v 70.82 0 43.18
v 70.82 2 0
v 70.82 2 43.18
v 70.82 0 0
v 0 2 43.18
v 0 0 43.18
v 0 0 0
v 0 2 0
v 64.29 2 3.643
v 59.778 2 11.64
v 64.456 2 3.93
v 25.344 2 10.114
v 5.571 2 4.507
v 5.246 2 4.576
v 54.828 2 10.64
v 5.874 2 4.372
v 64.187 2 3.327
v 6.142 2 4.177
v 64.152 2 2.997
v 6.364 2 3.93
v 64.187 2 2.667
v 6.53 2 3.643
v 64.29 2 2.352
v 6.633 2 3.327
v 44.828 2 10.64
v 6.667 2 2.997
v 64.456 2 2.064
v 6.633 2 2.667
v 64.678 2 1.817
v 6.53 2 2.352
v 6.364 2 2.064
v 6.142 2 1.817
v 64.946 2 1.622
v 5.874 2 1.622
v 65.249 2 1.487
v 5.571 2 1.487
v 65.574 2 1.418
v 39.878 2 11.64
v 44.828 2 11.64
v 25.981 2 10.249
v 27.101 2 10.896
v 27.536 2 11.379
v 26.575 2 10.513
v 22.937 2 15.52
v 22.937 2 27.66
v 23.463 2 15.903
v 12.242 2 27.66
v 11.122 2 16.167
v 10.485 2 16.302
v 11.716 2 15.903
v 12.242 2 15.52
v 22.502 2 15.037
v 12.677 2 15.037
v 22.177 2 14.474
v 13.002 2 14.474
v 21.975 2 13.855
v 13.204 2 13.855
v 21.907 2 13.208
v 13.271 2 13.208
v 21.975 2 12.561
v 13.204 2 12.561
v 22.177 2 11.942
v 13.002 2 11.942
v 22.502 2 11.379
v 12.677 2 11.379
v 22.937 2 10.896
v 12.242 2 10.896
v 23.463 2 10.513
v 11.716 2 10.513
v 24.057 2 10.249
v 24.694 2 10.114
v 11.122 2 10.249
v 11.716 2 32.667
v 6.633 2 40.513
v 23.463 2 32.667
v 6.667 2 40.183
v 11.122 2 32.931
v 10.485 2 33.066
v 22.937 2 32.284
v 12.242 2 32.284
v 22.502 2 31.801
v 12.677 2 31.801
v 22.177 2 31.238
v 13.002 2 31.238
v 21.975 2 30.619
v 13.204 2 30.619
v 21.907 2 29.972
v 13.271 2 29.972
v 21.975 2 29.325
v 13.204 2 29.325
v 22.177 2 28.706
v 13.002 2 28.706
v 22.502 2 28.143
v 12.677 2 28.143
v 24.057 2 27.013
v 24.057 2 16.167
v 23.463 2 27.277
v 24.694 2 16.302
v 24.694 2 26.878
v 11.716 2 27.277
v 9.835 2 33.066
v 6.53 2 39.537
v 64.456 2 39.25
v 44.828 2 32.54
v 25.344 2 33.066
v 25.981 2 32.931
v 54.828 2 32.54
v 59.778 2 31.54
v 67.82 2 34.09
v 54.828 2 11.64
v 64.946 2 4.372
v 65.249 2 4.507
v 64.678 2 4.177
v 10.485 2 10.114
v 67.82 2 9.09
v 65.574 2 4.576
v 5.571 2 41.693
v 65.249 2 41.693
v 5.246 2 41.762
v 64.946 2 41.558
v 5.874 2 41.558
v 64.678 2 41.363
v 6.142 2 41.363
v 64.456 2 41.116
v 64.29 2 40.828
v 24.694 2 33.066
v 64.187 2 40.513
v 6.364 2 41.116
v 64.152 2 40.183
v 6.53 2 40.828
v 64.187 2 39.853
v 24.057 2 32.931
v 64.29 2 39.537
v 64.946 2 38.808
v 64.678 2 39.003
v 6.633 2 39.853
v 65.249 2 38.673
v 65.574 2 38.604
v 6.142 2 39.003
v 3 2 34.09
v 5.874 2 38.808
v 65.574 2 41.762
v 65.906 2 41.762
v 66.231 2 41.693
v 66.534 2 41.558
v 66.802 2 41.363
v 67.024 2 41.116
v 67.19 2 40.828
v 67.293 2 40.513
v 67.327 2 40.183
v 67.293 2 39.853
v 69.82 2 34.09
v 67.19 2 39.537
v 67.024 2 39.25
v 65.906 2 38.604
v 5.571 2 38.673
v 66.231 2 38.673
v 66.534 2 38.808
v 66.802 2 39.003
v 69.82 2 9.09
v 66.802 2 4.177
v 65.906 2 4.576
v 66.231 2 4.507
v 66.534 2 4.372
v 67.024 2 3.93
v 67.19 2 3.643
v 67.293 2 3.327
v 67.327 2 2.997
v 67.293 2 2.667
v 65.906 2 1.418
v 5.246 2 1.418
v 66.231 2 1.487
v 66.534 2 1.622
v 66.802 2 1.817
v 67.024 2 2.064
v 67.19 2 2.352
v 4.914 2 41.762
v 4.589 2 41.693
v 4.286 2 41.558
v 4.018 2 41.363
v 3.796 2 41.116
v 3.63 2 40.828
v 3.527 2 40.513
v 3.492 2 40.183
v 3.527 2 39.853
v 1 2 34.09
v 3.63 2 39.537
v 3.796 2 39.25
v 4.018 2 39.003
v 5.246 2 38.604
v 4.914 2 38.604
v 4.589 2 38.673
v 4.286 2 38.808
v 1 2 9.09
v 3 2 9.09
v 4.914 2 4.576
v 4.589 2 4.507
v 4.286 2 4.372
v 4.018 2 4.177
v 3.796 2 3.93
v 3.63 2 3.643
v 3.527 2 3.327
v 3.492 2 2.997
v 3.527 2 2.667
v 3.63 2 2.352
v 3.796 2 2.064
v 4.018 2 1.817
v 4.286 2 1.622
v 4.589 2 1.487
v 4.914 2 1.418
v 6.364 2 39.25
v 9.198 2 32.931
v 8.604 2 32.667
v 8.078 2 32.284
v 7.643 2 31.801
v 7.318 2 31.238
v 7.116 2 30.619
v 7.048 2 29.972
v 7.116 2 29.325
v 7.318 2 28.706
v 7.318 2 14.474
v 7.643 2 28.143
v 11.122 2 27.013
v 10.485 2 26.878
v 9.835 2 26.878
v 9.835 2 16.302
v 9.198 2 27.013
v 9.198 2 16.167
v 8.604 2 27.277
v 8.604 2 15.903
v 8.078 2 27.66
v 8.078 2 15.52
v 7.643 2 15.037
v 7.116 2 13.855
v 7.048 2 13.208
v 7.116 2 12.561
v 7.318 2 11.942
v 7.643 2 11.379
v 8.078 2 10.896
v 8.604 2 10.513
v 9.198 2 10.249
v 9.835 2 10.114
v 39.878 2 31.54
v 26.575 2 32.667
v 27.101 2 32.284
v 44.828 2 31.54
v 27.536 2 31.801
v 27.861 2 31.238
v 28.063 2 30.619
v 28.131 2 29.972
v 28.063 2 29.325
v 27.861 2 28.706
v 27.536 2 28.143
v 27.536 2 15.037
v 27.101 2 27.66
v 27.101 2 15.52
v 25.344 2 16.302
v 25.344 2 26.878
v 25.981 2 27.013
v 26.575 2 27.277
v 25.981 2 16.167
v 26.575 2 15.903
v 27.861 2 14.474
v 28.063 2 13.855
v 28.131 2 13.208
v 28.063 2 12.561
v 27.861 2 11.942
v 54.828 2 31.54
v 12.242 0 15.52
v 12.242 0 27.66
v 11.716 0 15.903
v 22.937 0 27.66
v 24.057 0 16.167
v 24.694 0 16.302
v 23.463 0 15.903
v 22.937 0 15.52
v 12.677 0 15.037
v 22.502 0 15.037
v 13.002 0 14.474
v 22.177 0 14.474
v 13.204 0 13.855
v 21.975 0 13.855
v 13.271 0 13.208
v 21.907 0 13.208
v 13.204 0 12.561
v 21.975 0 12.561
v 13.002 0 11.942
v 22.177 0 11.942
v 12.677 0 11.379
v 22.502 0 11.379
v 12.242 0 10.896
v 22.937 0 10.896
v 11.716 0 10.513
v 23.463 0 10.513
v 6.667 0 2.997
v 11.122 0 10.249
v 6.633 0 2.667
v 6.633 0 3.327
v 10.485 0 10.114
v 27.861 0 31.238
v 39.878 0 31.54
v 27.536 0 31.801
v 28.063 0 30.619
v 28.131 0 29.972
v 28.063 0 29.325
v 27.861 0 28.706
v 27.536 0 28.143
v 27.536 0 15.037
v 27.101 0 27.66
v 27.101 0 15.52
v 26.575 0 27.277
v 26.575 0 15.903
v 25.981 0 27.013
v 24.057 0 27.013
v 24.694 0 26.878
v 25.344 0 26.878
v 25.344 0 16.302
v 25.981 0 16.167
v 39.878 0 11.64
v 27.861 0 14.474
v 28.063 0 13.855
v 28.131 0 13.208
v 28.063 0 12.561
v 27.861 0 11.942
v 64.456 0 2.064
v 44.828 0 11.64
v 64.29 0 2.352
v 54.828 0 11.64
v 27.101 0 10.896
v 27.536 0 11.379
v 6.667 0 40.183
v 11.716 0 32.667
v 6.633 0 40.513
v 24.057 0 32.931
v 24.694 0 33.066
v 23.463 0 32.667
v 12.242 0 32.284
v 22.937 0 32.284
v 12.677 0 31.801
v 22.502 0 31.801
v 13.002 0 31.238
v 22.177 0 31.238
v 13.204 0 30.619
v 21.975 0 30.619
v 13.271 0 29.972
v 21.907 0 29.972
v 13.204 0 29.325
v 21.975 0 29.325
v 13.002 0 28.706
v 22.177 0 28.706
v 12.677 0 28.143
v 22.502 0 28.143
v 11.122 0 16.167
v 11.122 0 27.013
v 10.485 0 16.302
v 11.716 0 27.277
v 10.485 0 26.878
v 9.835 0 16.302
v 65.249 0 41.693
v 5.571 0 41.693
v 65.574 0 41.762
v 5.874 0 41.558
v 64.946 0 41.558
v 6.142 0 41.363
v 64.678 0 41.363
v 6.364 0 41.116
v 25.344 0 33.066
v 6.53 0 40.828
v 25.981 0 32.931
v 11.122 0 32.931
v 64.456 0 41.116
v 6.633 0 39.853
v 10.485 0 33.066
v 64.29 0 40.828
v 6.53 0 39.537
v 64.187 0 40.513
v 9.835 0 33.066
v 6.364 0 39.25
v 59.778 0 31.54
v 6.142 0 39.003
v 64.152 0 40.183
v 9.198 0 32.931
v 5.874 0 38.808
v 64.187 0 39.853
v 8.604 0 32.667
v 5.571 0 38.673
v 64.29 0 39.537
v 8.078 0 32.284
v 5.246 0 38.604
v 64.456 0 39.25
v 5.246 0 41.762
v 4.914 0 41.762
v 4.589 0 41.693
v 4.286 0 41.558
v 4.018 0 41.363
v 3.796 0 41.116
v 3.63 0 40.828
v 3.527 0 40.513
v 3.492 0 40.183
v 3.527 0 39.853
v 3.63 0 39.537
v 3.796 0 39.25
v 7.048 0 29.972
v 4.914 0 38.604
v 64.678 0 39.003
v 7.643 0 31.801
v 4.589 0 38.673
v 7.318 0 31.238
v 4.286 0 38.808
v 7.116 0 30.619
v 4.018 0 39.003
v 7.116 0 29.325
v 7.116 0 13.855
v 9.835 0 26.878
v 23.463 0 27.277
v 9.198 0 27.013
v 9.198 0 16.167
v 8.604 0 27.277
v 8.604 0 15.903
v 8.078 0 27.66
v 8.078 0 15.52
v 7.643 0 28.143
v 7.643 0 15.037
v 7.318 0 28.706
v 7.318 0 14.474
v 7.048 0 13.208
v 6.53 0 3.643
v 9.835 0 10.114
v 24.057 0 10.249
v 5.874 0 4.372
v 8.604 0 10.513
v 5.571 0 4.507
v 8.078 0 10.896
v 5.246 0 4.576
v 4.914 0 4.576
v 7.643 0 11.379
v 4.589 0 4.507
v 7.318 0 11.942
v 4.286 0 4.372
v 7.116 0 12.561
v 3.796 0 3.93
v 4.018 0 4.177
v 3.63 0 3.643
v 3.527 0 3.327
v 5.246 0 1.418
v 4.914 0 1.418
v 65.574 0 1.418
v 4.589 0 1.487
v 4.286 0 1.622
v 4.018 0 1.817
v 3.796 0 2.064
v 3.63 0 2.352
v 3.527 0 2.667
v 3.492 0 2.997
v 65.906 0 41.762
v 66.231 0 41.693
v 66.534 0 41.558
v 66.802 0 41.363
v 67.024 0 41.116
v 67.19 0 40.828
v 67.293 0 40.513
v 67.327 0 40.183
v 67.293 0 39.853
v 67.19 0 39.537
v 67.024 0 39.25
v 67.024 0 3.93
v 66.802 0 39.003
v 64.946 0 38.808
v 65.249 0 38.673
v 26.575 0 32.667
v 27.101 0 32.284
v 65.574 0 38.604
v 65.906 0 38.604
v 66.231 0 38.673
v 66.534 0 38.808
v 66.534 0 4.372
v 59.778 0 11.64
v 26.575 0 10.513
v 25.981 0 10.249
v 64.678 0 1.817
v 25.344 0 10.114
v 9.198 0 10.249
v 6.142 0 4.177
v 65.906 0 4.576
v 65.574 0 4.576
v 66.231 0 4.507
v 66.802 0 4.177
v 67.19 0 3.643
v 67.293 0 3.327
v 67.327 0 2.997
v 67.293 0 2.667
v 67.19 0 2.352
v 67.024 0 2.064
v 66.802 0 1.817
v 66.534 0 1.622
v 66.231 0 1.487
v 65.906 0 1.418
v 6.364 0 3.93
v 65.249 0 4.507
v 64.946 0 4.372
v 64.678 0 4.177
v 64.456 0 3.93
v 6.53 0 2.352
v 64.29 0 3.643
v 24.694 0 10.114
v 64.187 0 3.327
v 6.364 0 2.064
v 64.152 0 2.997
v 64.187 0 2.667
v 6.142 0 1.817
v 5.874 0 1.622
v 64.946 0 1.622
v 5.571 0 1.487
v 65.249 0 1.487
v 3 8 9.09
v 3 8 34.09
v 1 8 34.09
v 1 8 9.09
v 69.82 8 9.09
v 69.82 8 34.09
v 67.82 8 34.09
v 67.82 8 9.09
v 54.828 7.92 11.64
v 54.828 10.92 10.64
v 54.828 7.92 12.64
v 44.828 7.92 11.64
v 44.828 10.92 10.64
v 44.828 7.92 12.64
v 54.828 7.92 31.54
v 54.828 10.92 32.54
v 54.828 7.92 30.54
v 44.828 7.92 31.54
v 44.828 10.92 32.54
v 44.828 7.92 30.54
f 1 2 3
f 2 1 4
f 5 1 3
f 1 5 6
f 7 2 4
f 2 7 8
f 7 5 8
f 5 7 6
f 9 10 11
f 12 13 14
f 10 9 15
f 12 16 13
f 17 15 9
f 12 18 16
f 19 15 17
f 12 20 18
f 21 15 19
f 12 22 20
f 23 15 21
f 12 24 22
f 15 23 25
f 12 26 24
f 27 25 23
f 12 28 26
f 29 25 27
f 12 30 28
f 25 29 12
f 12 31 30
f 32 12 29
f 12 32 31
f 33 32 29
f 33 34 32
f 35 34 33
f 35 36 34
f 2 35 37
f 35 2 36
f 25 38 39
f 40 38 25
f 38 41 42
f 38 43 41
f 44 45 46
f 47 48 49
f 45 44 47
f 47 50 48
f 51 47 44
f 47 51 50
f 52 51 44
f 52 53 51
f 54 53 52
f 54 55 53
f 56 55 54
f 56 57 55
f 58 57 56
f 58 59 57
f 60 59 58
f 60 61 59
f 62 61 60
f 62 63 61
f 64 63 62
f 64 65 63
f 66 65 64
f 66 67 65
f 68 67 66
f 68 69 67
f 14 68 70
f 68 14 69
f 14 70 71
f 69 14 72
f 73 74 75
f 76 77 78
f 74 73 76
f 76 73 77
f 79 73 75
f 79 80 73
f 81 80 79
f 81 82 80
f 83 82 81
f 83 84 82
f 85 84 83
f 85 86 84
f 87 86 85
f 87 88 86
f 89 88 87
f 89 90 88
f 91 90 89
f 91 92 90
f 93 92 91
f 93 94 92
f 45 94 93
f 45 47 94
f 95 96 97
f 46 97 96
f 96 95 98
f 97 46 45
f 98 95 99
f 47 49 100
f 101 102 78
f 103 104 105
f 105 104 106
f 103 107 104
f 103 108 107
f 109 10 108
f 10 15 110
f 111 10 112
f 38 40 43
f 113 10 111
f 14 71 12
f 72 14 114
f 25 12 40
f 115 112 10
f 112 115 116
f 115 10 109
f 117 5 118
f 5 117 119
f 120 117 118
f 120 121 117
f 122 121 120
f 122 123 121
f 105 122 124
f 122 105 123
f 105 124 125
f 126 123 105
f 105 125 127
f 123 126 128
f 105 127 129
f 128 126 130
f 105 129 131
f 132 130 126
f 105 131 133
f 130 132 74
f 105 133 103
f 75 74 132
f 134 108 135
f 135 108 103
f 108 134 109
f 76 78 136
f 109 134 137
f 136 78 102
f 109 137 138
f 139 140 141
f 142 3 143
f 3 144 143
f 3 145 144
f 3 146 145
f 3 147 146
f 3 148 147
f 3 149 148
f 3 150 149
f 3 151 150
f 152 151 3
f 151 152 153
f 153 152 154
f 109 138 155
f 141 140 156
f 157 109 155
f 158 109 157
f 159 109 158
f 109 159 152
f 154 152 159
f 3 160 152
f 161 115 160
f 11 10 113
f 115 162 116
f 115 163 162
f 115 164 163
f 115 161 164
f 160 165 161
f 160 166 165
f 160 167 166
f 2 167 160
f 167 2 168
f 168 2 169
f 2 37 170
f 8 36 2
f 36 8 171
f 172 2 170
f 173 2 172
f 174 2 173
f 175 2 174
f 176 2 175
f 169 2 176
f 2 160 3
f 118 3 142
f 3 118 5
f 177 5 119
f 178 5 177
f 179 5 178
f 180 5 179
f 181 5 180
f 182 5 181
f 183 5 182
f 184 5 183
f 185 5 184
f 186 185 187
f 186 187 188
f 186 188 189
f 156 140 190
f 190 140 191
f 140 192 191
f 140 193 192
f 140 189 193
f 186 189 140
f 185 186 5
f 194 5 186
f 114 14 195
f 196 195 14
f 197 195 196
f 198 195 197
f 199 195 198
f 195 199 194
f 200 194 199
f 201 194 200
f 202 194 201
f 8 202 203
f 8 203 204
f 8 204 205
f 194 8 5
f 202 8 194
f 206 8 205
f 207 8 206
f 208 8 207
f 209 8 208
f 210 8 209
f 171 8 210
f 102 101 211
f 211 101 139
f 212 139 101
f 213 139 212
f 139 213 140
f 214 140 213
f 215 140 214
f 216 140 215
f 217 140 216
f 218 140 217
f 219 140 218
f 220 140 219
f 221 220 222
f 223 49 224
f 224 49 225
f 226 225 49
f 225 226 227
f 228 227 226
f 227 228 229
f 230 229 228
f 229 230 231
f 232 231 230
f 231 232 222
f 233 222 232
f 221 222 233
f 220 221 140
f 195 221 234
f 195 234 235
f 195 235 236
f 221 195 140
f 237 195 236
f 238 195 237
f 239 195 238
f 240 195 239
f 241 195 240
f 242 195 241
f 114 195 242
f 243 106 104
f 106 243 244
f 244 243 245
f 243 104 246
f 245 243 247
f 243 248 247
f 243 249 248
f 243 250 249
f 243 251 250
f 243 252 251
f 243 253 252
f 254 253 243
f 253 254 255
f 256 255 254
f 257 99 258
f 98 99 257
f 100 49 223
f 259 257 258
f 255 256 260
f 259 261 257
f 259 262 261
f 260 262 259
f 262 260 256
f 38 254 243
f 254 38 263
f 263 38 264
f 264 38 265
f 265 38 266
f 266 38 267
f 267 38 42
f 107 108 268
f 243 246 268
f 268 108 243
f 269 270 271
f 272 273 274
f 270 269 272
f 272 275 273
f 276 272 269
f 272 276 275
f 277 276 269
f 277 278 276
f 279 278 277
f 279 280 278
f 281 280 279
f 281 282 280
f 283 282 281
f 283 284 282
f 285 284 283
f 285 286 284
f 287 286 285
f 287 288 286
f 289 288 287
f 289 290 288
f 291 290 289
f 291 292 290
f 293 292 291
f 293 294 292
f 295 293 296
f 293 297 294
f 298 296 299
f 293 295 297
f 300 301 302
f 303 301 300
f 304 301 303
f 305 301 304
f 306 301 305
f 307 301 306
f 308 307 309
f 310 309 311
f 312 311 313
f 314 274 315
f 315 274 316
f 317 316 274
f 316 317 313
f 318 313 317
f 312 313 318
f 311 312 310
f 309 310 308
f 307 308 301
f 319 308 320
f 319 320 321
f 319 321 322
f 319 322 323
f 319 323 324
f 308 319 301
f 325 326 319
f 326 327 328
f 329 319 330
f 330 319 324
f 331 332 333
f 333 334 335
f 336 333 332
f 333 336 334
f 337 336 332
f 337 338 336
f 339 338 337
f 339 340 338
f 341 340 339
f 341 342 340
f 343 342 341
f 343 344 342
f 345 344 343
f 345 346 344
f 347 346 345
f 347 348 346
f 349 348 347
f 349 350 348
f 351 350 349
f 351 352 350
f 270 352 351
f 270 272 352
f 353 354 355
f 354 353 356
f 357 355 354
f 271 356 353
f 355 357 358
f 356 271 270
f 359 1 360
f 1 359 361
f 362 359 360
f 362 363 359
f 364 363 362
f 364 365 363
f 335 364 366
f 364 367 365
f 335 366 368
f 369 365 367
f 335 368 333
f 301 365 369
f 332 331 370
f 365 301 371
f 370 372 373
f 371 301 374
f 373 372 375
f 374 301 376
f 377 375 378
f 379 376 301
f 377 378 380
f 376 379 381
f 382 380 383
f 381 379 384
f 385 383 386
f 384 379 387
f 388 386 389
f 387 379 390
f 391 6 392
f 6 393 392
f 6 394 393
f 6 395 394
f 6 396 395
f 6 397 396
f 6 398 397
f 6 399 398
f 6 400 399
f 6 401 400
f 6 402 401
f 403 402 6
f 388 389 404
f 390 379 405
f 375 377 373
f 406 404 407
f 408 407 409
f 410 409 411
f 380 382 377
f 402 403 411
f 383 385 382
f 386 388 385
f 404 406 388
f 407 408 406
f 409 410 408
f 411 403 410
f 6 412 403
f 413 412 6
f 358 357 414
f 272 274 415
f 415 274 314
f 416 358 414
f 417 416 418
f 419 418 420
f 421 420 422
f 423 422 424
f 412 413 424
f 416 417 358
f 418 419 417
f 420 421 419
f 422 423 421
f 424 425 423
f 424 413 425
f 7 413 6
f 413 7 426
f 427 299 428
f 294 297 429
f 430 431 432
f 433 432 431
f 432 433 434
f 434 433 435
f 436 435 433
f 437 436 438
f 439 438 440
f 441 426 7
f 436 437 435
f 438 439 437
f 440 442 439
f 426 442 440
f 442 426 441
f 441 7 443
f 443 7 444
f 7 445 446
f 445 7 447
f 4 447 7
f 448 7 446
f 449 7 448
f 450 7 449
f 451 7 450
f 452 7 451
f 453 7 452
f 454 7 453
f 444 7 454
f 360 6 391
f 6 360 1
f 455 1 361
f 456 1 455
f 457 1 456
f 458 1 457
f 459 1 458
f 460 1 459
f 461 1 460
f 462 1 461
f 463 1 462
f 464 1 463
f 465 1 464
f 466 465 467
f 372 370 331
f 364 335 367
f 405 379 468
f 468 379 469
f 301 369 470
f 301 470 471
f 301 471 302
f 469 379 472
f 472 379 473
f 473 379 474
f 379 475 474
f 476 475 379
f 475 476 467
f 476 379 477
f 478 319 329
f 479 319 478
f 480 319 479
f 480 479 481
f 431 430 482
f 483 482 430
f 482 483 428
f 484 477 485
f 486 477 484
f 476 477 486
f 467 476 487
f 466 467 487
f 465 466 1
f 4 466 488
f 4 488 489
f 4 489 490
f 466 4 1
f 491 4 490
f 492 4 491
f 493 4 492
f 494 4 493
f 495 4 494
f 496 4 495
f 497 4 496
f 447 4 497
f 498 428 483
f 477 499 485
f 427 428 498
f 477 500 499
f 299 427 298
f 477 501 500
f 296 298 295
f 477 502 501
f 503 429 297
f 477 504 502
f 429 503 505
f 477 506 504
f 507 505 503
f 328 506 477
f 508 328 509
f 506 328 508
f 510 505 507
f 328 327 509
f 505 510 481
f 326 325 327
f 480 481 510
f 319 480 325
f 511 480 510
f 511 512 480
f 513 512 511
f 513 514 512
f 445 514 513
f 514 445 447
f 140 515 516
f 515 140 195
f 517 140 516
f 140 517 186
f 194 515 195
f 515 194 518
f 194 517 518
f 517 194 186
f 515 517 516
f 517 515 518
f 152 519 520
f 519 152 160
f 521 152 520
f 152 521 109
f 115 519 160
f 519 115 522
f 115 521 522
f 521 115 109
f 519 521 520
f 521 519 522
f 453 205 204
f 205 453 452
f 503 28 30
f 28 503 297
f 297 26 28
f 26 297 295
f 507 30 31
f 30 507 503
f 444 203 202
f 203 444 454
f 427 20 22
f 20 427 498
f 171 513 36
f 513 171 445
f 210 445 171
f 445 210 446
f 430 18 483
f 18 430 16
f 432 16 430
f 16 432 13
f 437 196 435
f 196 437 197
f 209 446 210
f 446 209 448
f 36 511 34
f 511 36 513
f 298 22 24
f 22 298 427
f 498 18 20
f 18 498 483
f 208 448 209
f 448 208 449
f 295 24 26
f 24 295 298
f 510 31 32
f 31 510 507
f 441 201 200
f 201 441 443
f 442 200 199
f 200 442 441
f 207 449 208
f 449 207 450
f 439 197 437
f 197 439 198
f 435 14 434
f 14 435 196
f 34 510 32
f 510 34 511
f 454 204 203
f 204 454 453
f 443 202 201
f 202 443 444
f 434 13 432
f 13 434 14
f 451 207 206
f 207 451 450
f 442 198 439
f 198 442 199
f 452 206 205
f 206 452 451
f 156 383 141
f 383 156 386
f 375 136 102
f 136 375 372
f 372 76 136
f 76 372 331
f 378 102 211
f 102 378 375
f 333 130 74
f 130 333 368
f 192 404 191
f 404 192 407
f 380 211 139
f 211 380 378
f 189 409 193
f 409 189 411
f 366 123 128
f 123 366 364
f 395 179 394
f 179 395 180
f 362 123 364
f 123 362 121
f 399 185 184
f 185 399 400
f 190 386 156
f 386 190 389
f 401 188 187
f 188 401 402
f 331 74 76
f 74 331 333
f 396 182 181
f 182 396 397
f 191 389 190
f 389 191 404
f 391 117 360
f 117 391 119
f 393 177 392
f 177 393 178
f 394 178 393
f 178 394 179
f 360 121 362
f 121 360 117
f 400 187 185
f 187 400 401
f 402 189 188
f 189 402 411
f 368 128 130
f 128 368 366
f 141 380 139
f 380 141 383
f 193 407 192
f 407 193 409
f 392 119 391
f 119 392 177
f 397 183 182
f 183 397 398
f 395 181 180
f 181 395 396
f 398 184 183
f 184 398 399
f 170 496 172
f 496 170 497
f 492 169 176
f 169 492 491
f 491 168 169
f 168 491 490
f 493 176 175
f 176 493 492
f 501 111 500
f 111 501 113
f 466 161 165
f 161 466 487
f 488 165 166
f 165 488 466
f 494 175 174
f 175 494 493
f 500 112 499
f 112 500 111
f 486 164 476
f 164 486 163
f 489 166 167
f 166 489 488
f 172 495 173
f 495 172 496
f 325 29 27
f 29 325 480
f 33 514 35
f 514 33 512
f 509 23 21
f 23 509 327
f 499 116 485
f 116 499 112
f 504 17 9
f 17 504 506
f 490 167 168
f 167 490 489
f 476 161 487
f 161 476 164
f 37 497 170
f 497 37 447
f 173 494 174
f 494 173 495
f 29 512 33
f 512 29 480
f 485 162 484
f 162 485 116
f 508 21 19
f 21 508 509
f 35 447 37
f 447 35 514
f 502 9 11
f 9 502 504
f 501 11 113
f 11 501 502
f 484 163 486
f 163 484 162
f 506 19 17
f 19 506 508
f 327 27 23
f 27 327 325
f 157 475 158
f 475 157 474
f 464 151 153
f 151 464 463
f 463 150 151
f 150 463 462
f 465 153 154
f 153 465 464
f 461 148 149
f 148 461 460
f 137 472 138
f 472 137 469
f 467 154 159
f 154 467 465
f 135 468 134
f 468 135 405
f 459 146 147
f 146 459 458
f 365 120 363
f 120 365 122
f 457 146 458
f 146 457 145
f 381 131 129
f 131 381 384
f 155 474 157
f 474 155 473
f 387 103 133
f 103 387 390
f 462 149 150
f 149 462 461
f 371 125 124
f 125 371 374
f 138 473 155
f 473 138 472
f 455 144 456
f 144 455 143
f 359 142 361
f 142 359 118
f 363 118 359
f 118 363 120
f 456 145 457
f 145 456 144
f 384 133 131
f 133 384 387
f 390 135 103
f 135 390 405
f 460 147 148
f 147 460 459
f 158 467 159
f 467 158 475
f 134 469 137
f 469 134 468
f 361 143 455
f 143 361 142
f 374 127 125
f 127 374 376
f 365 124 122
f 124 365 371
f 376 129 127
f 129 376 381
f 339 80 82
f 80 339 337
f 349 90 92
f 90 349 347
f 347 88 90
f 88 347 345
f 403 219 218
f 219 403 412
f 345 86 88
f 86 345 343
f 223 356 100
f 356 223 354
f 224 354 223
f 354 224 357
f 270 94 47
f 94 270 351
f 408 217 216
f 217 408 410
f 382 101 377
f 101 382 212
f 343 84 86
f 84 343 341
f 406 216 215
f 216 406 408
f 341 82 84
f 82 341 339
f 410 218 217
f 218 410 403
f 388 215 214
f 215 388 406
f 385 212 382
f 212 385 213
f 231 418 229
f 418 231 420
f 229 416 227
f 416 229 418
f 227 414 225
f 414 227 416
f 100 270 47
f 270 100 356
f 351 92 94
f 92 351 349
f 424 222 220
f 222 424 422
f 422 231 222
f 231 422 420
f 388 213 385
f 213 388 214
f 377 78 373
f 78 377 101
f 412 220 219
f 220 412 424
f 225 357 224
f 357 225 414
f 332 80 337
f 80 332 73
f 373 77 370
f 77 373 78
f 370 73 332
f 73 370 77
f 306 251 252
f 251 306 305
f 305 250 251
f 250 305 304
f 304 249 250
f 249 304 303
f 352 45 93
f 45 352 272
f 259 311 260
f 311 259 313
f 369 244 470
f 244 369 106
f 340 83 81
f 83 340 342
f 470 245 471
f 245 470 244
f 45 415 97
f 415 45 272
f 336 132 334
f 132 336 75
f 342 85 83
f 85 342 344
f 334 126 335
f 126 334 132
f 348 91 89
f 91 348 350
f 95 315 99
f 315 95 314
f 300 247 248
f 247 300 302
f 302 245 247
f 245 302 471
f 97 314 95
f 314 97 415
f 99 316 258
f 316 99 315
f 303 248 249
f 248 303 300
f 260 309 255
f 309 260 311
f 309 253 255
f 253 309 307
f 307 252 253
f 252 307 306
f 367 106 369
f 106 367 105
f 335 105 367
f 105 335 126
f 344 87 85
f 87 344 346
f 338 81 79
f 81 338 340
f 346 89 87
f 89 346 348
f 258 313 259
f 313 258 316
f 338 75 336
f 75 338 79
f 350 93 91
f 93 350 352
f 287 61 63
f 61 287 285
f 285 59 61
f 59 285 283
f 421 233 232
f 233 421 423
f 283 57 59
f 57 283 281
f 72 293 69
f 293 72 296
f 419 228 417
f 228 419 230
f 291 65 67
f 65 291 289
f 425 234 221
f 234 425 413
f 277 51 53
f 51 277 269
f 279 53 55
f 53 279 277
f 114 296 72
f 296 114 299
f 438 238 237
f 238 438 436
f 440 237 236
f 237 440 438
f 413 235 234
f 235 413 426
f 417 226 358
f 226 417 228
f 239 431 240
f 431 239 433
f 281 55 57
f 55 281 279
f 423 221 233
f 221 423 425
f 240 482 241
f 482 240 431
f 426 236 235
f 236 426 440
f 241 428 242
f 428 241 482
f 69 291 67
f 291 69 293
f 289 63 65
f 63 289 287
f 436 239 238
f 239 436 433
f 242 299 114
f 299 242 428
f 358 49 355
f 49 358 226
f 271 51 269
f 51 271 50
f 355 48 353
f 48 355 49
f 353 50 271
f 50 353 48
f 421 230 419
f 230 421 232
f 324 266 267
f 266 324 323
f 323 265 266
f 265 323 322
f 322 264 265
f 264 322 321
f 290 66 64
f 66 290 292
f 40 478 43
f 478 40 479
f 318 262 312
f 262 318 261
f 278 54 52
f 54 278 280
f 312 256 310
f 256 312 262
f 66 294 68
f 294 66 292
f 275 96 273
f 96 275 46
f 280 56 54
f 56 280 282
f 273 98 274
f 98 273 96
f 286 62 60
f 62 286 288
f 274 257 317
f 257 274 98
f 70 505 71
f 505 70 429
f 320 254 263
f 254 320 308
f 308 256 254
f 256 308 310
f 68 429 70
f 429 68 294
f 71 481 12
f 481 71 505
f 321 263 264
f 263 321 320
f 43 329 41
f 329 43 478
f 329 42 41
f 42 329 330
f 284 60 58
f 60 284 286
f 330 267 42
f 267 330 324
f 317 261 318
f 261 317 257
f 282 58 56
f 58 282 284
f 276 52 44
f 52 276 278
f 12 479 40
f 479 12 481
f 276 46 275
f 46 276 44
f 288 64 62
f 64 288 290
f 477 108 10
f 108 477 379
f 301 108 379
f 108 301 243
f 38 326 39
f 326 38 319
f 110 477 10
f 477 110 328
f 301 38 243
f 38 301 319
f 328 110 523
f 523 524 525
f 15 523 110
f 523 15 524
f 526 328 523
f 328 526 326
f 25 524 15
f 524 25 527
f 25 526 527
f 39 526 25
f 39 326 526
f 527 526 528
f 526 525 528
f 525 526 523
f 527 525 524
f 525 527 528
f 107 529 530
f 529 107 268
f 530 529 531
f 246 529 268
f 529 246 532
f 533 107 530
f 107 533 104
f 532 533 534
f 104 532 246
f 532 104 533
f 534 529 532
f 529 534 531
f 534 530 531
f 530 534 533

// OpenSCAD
// file: tile_common.scad
/*
Common modules and functions for 1U Tiles
*/

function inches( x) = x * 25.4; // convert inches to mm

// put a hole in the tile of diameter 'd' at position 'x','z'
module hole( x, z, d) {
    translate([x, 0, z])
        rotate([270,0,0])
            cylinder(r=(d / 2), h=30, center=true);
}
// file: blank_tile.scad
/*
A Pulp Logic compatible 1U blank tile.

based on the dimensions given here:
http://pulplogic.com/1u_tiles/

units: millimeters
*/

use <tile_common.scad>;

plate_height = inches(1.7); // spec is 1.7"

module front_face(plate_width) {
    thickness = 2; // thickness of PCB front panels
    cube([plate_width, thickness, plate_height], center=false);
}

rib_width = 2;
rib_inset = 1;
rib_height = 25; // max physically measured at 29.06
rib_depth = 8;
module left_stiffening_rib() {
    translate([rib_inset, 0, ((plate_height - rib_height) / 2)]){
        cube([rib_width, rib_depth, rib_height], center=false);
    }
}

module right_stiffening_rib(plate_width) {
    translate([((plate_width - rib_width) - rib_inset), 0, ((plate_height - rib_height) / 2)]){
        cube([rib_width, rib_depth, rib_height], center=false);
    }
}

module material(plate_width) {
    union() {
        front_face(plate_width);
        left_stiffening_rib();
        right_stiffening_rib(plate_width);
    }
}

module mounting_holes(plate_width) {
    // make round shapes more fine
    $fs = 0.1;

    mounting_hole_dia = inches(0.125); // spec 0.125"
    hole_horiz_offset = inches(0.200); // spec 0.200"
    hole_vert_offset = inches(0.118); // spec 0.118"

    module hole_pair(h_offset) {
        hole(x=h_offset, z=hole_vert_offset, d=mounting_hole_dia);
        
        hole(x=h_offset, z=(plate_height - hole_vert_offset), d=mounting_hole_dia);
    }
    hole_pair(hole_horiz_offset);
    hole_pair(plate_width - hole_horiz_offset);
}

module cutouts(plate_width) {
    mounting_holes(plate_width);
}

// hp is the width in eurorack 'hole positions'
module blank_tile(hp = 6) {
    plate_width = hp * 5.08 - 0.3; // general conversion factor with fudge for tolerance
    difference() {
        material(plate_width);
        cutouts(plate_width);
    }
}

blank_tile();
// main file
/*
A Pulp Logic compatible 1U with cutouts .

modified version of 'opl2_vco.scad'

units: millimeters
*/

use <blank_tile.scad>
use <tile_common.scad>

 // Columns
 col_spacing = 0.585;
 left = inches(0.4);
// Rows
top = inches(1.180);
bottom = inches(0.520);

module cutouts() {
    $fs=0.01; // make cylinder curves more fine

    center = left + inches(col_spacing);
    right = left + 2 * inches(col_spacing);

    // top-left jack
    hole(x=left, z=top, d=inches(0.245));

    // top-center jack
    hole(x=center, z=top, d=inches(0.245));

    // bottom-left jack
    hole(x=left, z=bottom, d=inches(0.245));

    // bottom-center jack
    hole(x=center, z=bottom, d=inches(0.245));

    // screen: http://adafru.it/454
    translate([left + 2 * inches(col_spacing), -1, (top+bottom)/2 - 19.9/2 ] ){
        cube([19.9, 4, 19.9]);
    }
}

// example from https://en.wikibooks.org/wiki/OpenSCAD_User_Manual/Primitive_Solids
module prism(l, w, h){
       polyhedron(
               points=[[0,0,0], [l,0,0], [l,w,0], [0,w,0], [0,w,h], [l,w,h]],
               faces=[[0,1,2,3],[5,4,3,2],[0,4,5,1],[0,3,4],[5,2,1]]
               );
}

module snap(w){
    cube([w,9,1]);
    translate([0,5+5.92,0]){
        mirror([0,1,0]){
            prism(w,3,2);
        }
    }
}

module display_snaps(){
    width = 10;
    offset = left + 2 * inches(col_spacing) + 19.9/2 - width/2;
    translate([offset, 0, (top+bottom)/2 - 19.9/2 - 1]){
        snap(width);
    }

    translate([offset , 0, (top+bottom)/2 + 19.9/2 + 1]){
        mirror([0,0,1]){
            snap(width);
        }
    }
}

module encoder_collar(){
    $fs=0.01; // make cylinder curves more fine
    difference(){
        translate([left + 5 * inches(col_spacing), 5, (top+bottom)/2]){
            rotate([90,0,0]){
                cylinder(10, 6, 6, center=true);
            }
        }
        translate([left + 5 * inches(col_spacing), 6, (top+bottom)/2+3]){
            cylinder(6, 1, 1, center=true);
        }
    }
}

module six_jacks() {
    union(){
        difference() {
            union(){
                blank_tile(14);
            }
            cutouts();
        }
        display_snaps();
        
    }
}

six_jacks();
